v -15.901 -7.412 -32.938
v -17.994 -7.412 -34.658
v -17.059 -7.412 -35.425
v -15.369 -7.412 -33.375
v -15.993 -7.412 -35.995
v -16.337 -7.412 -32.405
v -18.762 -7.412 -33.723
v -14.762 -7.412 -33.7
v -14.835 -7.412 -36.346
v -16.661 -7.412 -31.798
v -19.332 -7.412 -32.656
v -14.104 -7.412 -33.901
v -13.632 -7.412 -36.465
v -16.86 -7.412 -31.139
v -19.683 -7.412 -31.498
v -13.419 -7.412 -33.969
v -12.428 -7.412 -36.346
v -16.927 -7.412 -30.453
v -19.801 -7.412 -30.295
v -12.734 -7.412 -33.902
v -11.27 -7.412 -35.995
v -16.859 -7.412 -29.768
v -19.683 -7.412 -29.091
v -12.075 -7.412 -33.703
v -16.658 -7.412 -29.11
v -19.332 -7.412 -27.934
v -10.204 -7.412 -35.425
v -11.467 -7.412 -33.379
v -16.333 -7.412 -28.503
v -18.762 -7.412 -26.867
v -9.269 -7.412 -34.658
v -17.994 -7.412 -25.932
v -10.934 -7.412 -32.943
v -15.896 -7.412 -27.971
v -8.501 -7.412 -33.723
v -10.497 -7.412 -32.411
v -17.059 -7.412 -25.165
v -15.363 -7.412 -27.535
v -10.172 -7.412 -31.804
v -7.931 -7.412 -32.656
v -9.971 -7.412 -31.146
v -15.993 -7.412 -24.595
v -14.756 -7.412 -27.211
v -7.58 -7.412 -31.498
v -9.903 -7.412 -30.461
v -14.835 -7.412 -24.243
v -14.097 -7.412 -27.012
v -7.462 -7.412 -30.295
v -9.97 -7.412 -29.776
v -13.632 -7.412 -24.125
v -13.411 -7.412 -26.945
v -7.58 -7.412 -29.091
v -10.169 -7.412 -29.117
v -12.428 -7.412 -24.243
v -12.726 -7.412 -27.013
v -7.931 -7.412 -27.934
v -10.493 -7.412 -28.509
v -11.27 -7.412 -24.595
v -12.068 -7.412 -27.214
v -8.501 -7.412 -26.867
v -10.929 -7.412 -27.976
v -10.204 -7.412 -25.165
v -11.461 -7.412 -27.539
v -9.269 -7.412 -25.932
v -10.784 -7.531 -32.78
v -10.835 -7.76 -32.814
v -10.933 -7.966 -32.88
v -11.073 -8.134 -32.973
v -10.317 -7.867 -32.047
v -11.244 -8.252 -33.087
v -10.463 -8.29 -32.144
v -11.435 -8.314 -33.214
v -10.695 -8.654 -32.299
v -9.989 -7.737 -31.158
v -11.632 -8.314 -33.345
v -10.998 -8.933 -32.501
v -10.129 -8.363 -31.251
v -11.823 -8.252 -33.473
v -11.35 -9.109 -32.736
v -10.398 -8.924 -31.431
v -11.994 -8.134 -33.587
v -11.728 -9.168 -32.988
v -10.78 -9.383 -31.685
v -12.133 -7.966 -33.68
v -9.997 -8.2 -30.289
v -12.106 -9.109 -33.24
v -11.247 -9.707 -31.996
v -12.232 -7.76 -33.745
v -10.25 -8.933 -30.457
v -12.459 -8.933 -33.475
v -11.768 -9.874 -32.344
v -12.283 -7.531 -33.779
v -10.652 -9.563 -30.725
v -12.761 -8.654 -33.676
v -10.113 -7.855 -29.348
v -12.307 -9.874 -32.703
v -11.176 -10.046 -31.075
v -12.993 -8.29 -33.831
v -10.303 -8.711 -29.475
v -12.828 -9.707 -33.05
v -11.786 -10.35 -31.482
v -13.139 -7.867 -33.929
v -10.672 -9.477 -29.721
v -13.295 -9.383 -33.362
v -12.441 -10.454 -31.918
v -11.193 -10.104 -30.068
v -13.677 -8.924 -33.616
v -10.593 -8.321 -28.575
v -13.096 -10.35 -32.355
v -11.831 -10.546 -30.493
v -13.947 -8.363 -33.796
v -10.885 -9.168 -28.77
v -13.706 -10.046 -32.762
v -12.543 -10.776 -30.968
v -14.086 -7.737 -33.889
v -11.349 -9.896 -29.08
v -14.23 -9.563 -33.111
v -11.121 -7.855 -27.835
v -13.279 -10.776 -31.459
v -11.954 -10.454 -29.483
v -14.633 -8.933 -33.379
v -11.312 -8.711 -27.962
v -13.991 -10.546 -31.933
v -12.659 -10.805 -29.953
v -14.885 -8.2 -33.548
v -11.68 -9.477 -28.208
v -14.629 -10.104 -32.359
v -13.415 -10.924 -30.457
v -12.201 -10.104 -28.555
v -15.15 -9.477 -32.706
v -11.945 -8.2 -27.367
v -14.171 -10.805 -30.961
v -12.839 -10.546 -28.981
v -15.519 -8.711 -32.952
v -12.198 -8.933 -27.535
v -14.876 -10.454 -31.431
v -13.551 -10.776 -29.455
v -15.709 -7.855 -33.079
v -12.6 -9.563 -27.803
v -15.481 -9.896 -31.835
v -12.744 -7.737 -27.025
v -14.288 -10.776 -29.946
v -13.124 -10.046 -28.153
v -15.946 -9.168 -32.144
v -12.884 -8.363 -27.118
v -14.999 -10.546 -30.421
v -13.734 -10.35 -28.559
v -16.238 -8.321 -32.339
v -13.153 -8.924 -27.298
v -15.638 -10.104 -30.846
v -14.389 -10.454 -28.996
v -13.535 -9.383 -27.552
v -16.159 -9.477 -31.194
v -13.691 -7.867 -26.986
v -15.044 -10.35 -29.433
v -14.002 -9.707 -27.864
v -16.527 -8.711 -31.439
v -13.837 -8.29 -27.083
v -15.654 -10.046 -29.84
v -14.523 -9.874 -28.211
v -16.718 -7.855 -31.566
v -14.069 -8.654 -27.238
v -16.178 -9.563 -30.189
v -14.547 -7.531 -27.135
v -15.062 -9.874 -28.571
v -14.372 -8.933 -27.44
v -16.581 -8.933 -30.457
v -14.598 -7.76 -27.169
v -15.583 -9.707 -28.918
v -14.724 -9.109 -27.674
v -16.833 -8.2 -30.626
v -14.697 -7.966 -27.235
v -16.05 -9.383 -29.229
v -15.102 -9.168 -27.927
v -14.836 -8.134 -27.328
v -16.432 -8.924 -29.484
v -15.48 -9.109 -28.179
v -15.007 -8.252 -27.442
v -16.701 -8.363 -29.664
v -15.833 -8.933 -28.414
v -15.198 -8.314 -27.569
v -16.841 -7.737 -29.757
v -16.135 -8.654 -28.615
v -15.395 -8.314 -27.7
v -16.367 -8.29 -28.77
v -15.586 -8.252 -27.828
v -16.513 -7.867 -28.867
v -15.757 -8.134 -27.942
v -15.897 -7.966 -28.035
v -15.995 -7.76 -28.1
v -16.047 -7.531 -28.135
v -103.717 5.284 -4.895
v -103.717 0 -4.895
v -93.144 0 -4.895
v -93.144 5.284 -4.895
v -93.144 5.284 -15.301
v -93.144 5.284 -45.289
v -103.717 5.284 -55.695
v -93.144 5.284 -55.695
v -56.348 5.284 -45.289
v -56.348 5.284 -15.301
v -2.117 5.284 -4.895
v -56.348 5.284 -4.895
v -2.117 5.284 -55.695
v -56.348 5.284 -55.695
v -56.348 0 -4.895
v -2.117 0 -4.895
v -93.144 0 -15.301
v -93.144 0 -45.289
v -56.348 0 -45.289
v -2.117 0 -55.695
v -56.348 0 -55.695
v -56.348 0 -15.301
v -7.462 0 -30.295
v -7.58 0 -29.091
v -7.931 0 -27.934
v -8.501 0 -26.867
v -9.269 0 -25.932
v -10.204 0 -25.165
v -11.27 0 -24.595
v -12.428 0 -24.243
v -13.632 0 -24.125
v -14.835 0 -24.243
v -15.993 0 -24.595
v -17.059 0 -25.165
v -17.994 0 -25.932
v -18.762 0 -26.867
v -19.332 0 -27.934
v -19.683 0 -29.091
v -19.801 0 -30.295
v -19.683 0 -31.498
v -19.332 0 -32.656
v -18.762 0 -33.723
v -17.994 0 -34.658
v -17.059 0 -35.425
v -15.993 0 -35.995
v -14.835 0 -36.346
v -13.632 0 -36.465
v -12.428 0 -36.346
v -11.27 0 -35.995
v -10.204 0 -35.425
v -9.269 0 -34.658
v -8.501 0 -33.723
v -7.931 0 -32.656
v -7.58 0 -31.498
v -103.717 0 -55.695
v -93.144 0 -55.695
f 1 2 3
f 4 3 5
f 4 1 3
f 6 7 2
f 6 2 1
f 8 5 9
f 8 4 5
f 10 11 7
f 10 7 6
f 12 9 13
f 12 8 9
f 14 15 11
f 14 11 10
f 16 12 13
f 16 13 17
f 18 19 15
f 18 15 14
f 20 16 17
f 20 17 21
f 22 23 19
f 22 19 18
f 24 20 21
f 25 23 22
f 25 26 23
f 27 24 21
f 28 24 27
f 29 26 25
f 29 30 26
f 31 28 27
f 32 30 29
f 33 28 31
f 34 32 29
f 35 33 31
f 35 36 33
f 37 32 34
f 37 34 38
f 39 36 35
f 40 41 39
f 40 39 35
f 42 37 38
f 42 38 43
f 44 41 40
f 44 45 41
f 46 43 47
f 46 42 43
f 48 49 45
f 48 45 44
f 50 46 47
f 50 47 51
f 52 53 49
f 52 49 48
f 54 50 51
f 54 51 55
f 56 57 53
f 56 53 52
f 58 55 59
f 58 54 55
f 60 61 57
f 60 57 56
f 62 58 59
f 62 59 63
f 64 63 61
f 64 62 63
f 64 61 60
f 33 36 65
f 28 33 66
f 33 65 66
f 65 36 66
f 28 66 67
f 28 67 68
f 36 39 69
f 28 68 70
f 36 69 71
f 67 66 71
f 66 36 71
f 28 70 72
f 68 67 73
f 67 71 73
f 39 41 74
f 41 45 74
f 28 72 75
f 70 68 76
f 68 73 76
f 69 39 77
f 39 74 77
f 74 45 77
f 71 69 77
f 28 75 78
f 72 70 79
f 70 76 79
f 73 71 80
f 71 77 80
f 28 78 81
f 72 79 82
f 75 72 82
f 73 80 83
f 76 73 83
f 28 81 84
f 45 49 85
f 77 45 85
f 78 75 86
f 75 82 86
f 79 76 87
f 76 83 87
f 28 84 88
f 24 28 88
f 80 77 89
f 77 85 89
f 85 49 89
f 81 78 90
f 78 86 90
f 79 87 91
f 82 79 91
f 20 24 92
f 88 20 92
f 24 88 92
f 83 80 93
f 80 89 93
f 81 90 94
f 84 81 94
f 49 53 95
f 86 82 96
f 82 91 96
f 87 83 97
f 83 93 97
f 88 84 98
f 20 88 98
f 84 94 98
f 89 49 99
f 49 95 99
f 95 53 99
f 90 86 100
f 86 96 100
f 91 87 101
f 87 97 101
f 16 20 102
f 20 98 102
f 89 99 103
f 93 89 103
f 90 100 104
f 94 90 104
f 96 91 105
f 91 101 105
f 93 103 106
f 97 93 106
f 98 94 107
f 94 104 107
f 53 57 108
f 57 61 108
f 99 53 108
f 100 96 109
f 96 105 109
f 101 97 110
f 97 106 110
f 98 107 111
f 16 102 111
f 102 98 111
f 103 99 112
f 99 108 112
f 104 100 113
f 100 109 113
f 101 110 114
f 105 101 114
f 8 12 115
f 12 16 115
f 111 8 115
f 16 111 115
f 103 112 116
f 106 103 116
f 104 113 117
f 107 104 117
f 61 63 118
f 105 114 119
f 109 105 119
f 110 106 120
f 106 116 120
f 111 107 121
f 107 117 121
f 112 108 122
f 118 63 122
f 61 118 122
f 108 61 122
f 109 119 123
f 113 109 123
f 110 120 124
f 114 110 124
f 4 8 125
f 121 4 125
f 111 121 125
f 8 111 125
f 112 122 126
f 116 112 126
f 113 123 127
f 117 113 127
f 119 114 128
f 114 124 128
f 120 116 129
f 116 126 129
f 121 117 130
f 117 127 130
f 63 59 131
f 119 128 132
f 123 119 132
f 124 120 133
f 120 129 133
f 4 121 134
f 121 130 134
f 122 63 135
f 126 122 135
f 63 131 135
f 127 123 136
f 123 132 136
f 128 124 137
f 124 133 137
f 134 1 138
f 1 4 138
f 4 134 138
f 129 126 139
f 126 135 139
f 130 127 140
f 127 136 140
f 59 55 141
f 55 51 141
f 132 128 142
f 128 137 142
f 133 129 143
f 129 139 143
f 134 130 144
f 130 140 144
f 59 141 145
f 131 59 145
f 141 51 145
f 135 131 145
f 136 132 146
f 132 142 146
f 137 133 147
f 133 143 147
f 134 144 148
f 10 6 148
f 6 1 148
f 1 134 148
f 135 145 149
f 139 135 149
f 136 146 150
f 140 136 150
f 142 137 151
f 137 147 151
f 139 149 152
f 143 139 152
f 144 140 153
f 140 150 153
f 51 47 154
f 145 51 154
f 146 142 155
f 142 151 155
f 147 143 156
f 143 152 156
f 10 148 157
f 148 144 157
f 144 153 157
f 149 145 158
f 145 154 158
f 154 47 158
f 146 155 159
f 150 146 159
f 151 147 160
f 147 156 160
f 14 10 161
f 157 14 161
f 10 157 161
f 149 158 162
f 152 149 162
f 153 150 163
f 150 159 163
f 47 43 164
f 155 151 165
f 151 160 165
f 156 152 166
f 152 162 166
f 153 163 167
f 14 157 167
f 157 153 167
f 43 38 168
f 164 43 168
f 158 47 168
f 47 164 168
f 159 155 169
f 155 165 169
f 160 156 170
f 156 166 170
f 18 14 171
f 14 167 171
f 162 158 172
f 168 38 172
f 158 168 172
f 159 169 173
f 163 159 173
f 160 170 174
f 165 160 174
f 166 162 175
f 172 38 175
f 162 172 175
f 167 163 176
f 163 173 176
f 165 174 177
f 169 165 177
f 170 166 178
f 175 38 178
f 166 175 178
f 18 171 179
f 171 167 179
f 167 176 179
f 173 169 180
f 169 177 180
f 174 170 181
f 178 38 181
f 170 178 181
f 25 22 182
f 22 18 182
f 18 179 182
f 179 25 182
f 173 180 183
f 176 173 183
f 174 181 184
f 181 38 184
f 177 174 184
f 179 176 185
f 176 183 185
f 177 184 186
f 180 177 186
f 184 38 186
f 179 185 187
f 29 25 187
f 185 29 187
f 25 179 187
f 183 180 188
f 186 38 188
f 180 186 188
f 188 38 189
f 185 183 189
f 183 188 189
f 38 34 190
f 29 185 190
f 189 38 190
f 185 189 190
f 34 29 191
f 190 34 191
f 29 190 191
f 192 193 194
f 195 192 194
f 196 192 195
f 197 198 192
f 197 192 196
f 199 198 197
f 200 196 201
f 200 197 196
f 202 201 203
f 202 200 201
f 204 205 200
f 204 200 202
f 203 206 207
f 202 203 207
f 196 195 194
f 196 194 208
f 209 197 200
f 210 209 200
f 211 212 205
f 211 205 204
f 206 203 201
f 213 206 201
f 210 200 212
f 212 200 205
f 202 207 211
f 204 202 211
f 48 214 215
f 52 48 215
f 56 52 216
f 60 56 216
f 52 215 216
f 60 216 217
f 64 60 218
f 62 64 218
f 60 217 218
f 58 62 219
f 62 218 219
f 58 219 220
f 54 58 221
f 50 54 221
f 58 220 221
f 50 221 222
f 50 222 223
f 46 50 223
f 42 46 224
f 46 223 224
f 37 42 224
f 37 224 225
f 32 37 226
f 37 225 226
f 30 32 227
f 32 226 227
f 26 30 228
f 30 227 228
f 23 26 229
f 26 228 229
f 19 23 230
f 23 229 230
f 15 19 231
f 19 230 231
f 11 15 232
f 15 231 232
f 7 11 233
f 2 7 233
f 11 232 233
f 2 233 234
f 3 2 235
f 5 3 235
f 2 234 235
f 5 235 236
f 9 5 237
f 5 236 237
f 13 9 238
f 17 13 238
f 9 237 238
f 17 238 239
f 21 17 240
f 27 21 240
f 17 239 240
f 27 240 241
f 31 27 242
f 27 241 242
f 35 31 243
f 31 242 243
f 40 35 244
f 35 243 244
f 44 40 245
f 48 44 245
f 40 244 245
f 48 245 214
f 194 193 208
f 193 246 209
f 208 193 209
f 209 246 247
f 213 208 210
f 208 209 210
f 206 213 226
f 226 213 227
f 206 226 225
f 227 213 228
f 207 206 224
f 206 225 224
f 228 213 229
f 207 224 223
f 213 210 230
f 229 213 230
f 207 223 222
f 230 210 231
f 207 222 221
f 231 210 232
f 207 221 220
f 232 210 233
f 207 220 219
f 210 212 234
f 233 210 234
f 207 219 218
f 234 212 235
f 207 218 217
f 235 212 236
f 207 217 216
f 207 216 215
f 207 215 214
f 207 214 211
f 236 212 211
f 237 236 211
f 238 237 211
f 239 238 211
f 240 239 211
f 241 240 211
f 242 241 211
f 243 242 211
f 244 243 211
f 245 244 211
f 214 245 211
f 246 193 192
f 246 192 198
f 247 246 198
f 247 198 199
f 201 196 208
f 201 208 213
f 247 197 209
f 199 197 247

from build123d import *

# Parameters (mm, degrees)
SKETCH1_W           = 101.6
SKETCH1_H           = 50.8
BOSS_EXTRUDE1_DEPTH = 10
SKETCH3_W           = 36.795970914
SKETCH3_H           = 10.40575266
SKETCH3_H_2         = 15.093919488
CUT_EXTRUDE4_DEPTH  = 10
BOSS_EXTRUDE3_DEPTH = 7.412460188
SKETCH8_W           = 111.985504673
SKETCH8_H           = 56.913410447
CUT_EXTRUDE5_DEPTH  = 4.716


with BuildPart() as part:
    # Sketch1 → Boss-Extrude1 (new body)
    with BuildSketch(Plane(origin=(0, 0, 0), x_dir=(1, 0, 0), z_dir=(0, 1, 0))):
        with Locations((-52.916666667, 30.294791667)):
            Rectangle(SKETCH1_W, SKETCH1_H)
    extrude(amount=BOSS_EXTRUDE1_DEPTH)

    # Sketch3 → Cut-Extrude4 (cut)
    with BuildSketch(Plane(origin=(0, 10, 0), x_dir=(1, 0, 0), z_dir=(0, 1, 0))):
        with Locations((-74.746447121, 10.097667997)):
            Rectangle(SKETCH3_W, SKETCH3_H)
        with Locations((-74.746447121, 52.83599875)):
            Rectangle(SKETCH3_W, SKETCH3_H_2)
    extrude(amount=-CUT_EXTRUDE4_DEPTH, mode=Mode.SUBTRACT)

    # Sketch5 → Boss-Extrude3 (add)
    with BuildSketch(Plane.XZ):
        with BuildLine():
            ThreePointArc((-19.801479391, -30.294791667), (-13.631556544, -36.464714513), (-7.461633698, -30.294791667))
            Line((-7.461633698, -30.294791667), (-19.801479391, -30.294791667))
        make_face()
        with BuildLine():
            Line((-19.801479391, -30.294791667), (-7.461633698, -30.294791667))
            ThreePointArc((-7.461633698, -30.294791667), (-13.631556544, -24.12486882), (-19.801479391, -30.294791667))
        make_face()
    extrude(amount=BOSS_EXTRUDE3_DEPTH)

    # Sketch7 → Revolve3 (revolve)
    with BuildSketch(Plane.XZ.offset(7.412460188)):
        with BuildLine():
            Line((-15.363131646, -27.535093848), (-11.467087667, -33.379159817))
            ThreePointArc((-11.467087667, -33.379159817), (-10.493076672, -28.509104843), (-15.363131646, -27.535093848))
        make_face()
    revolve(axis=Axis((-15.363131646, -7.412460188, -27.535093848), (0.5547001962252264, 0, -0.8320502943378455)))

    # Sketch8 → Cut-Extrude5 (cut)
    with BuildSketch(Plane(origin=(0, 10, 0), x_dir=(1, 0, 0), z_dir=(0, 1, 0))):
        with Locations((-50.660840015, 30.234288396)):
            Rectangle(SKETCH8_W, SKETCH8_H)
    extrude(amount=-CUT_EXTRUDE5_DEPTH, mode=Mode.SUBTRACT)


solid = part.part
